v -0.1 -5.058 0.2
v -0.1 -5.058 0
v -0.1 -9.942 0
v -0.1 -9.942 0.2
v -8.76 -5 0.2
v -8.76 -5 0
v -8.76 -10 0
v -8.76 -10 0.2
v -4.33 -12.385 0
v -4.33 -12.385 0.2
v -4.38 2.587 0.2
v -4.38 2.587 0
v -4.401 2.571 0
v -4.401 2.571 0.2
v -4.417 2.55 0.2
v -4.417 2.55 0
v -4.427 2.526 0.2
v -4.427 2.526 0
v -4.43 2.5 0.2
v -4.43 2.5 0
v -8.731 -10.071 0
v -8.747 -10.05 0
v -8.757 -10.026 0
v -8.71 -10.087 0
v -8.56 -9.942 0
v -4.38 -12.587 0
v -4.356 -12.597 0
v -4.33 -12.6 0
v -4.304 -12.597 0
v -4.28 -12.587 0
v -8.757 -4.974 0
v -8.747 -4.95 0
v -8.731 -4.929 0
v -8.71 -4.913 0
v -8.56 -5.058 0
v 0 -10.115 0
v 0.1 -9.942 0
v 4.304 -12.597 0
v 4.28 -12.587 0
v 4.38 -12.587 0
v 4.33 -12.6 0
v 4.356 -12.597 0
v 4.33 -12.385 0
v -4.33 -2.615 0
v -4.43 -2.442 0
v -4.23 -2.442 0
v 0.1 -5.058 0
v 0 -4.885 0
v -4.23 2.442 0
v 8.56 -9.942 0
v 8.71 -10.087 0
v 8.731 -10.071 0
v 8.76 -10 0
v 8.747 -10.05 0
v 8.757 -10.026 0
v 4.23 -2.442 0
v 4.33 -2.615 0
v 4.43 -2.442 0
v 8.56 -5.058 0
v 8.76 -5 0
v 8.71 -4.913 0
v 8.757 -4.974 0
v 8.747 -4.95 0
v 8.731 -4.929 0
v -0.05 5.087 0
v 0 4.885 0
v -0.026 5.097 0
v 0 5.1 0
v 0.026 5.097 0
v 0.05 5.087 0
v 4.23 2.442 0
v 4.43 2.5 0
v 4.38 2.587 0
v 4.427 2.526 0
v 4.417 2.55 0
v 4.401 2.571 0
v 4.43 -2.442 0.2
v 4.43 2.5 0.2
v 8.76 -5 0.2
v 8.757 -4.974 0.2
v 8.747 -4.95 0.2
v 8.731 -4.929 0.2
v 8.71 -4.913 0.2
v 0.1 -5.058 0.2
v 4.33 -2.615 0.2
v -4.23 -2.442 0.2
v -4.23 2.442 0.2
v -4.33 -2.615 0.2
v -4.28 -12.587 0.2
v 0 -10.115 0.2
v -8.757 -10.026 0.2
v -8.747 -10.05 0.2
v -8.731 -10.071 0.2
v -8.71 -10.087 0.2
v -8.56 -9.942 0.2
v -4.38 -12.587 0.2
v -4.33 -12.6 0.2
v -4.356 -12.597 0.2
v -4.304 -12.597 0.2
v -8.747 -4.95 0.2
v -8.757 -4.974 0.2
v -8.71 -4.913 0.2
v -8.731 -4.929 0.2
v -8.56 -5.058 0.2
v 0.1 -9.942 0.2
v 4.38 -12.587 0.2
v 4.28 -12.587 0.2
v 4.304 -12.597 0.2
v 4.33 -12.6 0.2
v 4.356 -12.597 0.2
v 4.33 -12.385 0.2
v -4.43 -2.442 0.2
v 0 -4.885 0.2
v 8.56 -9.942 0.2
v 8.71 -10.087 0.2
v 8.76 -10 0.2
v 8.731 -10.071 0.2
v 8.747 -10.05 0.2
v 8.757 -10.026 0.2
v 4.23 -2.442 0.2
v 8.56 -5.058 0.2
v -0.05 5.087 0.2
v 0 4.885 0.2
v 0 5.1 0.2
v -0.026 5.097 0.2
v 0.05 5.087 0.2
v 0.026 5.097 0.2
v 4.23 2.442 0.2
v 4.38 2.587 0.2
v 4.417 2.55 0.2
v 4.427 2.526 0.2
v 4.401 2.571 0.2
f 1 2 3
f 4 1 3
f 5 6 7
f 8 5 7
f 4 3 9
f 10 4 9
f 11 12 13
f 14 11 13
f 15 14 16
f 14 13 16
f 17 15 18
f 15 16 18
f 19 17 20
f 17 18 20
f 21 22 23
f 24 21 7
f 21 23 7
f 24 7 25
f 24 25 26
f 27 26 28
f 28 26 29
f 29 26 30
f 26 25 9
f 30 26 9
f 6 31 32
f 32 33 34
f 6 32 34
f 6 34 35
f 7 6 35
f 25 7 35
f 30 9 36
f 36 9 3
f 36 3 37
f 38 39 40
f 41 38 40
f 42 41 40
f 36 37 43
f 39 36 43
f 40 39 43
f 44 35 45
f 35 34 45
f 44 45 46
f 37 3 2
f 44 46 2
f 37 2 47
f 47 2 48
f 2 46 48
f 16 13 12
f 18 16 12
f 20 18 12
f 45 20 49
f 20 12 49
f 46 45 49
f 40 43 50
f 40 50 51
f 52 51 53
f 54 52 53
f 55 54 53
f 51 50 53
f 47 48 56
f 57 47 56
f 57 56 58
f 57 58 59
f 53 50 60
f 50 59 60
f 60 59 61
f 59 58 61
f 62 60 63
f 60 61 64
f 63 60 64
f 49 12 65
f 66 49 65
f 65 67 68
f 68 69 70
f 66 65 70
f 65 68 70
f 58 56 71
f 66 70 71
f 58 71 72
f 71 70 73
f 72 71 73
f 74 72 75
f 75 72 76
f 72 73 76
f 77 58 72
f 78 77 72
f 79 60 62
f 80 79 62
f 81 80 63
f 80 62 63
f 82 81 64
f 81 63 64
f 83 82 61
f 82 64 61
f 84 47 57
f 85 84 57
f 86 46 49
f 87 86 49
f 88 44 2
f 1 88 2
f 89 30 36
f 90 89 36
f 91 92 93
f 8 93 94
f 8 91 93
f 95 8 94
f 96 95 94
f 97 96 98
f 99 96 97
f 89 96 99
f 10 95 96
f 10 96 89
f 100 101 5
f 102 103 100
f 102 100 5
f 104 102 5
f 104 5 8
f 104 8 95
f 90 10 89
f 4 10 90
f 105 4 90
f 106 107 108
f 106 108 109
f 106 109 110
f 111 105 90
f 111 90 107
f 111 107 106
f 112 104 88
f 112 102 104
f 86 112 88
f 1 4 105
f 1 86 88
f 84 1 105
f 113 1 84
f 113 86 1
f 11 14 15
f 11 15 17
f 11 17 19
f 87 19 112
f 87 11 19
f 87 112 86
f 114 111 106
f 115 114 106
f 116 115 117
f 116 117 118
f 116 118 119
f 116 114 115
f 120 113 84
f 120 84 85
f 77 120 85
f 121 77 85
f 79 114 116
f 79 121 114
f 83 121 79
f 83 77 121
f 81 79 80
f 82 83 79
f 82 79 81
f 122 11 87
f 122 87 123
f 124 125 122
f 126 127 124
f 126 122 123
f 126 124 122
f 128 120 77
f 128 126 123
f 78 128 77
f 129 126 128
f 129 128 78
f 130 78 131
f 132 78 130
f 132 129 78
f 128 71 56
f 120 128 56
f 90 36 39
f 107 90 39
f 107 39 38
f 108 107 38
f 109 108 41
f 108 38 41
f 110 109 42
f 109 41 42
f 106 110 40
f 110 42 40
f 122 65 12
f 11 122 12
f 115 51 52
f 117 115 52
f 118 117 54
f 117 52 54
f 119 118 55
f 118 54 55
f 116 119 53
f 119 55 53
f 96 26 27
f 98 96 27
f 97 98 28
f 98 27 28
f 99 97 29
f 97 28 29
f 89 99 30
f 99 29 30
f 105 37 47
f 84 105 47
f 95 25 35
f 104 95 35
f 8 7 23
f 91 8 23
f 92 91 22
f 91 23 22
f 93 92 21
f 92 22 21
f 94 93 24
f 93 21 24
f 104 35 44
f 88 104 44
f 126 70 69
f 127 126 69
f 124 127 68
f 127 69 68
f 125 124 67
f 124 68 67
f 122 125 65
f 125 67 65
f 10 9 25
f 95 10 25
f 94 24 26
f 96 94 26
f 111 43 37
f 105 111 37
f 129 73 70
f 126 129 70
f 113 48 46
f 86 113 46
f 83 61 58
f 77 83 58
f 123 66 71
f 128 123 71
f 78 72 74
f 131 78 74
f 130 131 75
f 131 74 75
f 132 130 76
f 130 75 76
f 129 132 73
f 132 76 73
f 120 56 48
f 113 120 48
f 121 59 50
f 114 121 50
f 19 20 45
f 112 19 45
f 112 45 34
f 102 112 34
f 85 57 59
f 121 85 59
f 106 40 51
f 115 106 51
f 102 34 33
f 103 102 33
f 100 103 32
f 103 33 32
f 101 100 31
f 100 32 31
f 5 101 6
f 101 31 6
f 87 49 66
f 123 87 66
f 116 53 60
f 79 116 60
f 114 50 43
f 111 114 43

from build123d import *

# Parameters (mm, degrees)
F1_DEPTH = 0.2


with BuildPart() as f1:
    # F0 (on Top) → F1 (new body)
    with BuildSketch(Plane.XY):
        with BuildLine():
            Line((-4.2435244785, 2.55), (-0.0866025404, 4.95))
            ThreePointArc((-0.0866025404, 4.95), (-0.0965925826, 5.0258819045), (-0.05, 5.0866025404))
            Line((-0.05, 5.0866025404), (-4.3801270189, 2.5866025404))
            ThreePointArc((-4.3801270189, 2.5866025404), (-4.3042451144, 2.5965925826), (-4.2435244785, 2.55))
        make_face()
        with BuildLine():
            Line((-4.3301270189, 2.5), (-4.2435244785, 2.55))
            ThreePointArc((-4.2435244785, 2.55), (-4.3042451144, 2.5965925826), (-4.3801270189, 2.5866025404))
            ThreePointArc((-4.3801270189, 2.5866025404), (-4.4167295593, 2.55), (-4.4301270189, 2.5))
            ThreePointArc((-4.4301270189, 2.5), (-4.400837697, 2.4292893219), (-4.3301270189, 2.4))
            Line((-4.3301270189, 2.4), (-4.3301270189, 2.5))
        make_face()
        with BuildLine():
            ThreePointArc((-4.2301270189, 2.5), (-4.2335344363, 2.5258819045), (-4.2435244785, 2.55))
            Line((-4.2435244785, 2.55), (-4.3301270189, 2.5))
            Line((-4.3301270189, 2.5), (-4.3301270189, 2.4))
            ThreePointArc((-4.3301270189, 2.4), (-4.3042451144, 2.4034074174), (-4.2801270189, 2.4133974596))
            Line((-4.2801270189, 2.4133974596), (-4.2301270189, 2.4422649731))
            Line((-4.2301270189, 2.4422649731), (-4.2301270189, 2.5))
        make_face()
        with BuildLine():
            Line((-4.3301270189, -2.4), (-4.3301270189, 2.4))
            ThreePointArc((-4.3301270189, 2.4), (-4.400837697, 2.4292893219), (-4.4301270189, 2.5))
            Line((-4.4301270189, 2.5), (-4.4301270189, -2.4422649731))
            Line((-4.4301270189, -2.4422649731), (-4.3801270189, -2.4133974596))
            ThreePointArc((-4.3801270189, -2.4133974596), (-4.3560089234, -2.4034074174), (-4.3301270189, -2.4))
        make_face()
        with BuildLine():
            Line((-4.2301270189, -2.4422649731), (-4.2301270189, 2.4422649731))
            Line((-4.2301270189, 2.4422649731), (-4.2801270189, 2.4133974596))
            ThreePointArc((-4.2801270189, 2.4133974596), (-4.3042451144, 2.4034074174), (-4.3301270189, 2.4))
            Line((-4.3301270189, 2.4), (-4.3301270189, -2.4))
            ThreePointArc((-4.3301270189, -2.4), (-4.3042451144, -2.4034074174), (-4.2801270189, -2.4133974596))
            Line((-4.2801270189, -2.4133974596), (-4.2301270189, -2.4422649731))
        make_face()
        with BuildLine():
            ThreePointArc((-0.05, 4.9133974596), (-0.0707106781, 4.9292893219), (-0.0866025404, 4.95))
            Line((-0.0866025404, 4.95), (-4.2435244785, 2.55))
            ThreePointArc((-4.2435244785, 2.55), (-4.2335344363, 2.5258819045), (-4.2301270189, 2.5))
            Line((-4.2301270189, 2.5), (-4.2301270189, 2.4422649731))
            Line((-4.2301270189, 2.4422649731), (0, 4.8845299462))
            Line((0, 4.8845299462), (-0.05, 4.9133974596))
        make_face()
        with BuildLine():
            Line((0.0866025404, 4.95), (0, 5))
            Line((0, 5), (-0.0866025404, 4.95))
            ThreePointArc((-0.0866025404, 4.95), (-0.0707106781, 4.9292893219), (-0.05, 4.9133974596))
            Line((-0.05, 4.9133974596), (0, 4.8845299462))
            Line((0, 4.8845299462), (0.05, 4.9133974596))
            ThreePointArc((0.05, 4.9133974596), (0.0707106781, 4.9292893219), (0.0866025404, 4.95))
        make_face()
        with BuildLine():
            Line((-0.0866025404, 4.95), (0, 5))
            Line((0, 5), (0.0866025404, 4.95))
            ThreePointArc((0.0866025404, 4.95), (0.0965925826, 5.0258819045), (0.05, 5.0866025404))
            ThreePointArc((0.05, 5.0866025404), (0, 5.1), (-0.05, 5.0866025404))
            ThreePointArc((-0.05, 5.0866025404), (-0.0965925826, 5.0258819045), (-0.0866025404, 4.95))
        make_face()
        with BuildLine():
            ThreePointArc((0.05, 5.0866025404), (0.0965925826, 5.0258819045), (0.0866025404, 4.95))
            Line((0.0866025404, 4.95), (4.2435244785, 2.55))
            ThreePointArc((4.2435244785, 2.55), (4.3042451144, 2.5965925826), (4.3801270189, 2.5866025404))
            Line((4.3801270189, 2.5866025404), (0.05, 5.0866025404))
        make_face()
        with BuildLine():
            Line((4.2435244785, 2.55), (0.0866025404, 4.95))
            ThreePointArc((0.0866025404, 4.95), (0.0707106781, 4.9292893219), (0.05, 4.9133974596))
            Line((0.05, 4.9133974596), (0, 4.8845299462))
            Line((0, 4.8845299462), (4.2301270189, 2.4422649731))
            Line((4.2301270189, 2.4422649731), (4.2301270189, 2.5))
            ThreePointArc((4.2301270189, 2.5), (4.2335344363, 2.5258819045), (4.2435244785, 2.55))
        make_face()
        with BuildLine():
            Line((4.3301270189, 2.5), (4.2435244785, 2.55))
            ThreePointArc((4.2435244785, 2.55), (4.2335344363, 2.5258819045), (4.2301270189, 2.5))
            Line((4.2301270189, 2.5), (4.2301270189, 2.4422649731))
            Line((4.2301270189, 2.4422649731), (4.2801270189, 2.4133974596))
            ThreePointArc((4.2801270189, 2.4133974596), (4.3042451144, 2.4034074174), (4.3301270189, 2.4))
            Line((4.3301270189, 2.4), (4.3301270189, 2.5))
        make_face()
        with BuildLine():
            ThreePointArc((4.3801270189, 2.5866025404), (4.3042451144, 2.5965925826), (4.2435244785, 2.55))
            Line((4.2435244785, 2.55), (4.3301270189, 2.5))
            Line((4.3301270189, 2.5), (4.3301270189, 2.4))
            ThreePointArc((4.3301270189, 2.4), (4.400837697, 2.4292893219), (4.4301270189, 2.5))
            ThreePointArc((4.4301270189, 2.5), (4.4167295593, 2.55), (4.3801270189, 2.5866025404))
        make_face()
        with BuildLine():
            Line((4.3301270189, -2.4), (4.3301270189, 2.4))
            ThreePointArc((4.3301270189, 2.4), (4.3042451144, 2.4034074174), (4.2801270189, 2.4133974596))
            Line((4.2801270189, 2.4133974596), (4.2301270189, 2.4422649731))
            Line((4.2301270189, 2.4422649731), (4.2301270189, -2.4422649731))
            Line((4.2301270189, -2.4422649731), (4.2801270189, -2.4133974596))
            ThreePointArc((4.2801270189, -2.4133974596), (4.3042451144, -2.4034074174), (4.3301270189, -2.4))
        make_face()
        with BuildLine():
            ThreePointArc((4.4301270189, 2.5), (4.400837697, 2.4292893219), (4.3301270189, 2.4))
            Line((4.3301270189, 2.4), (4.3301270189, -2.4))
            ThreePointArc((4.3301270189, -2.4), (4.3560089234, -2.4034074174), (4.3801270189, -2.4133974596))
            Line((4.3801270189, -2.4133974596), (4.4301270189, -2.4422649731))
            Line((4.4301270189, -2.4422649731), (4.4301270189, 2.5))
        make_face()
        with BuildLine():
            Line((4.2801270189, -2.4133974596), (4.2301270189, -2.4422649731))
            Line((4.2301270189, -2.4422649731), (4.2301270189, -2.5))
            ThreePointArc((4.2301270189, -2.5), (4.2435244785, -2.45), (4.2801270189, -2.4133974596))
        make_face()
        with BuildLine():
            Line((4.4301270189, -2.5), (4.4301270189, -2.4422649731))
            Line((4.4301270189, -2.4422649731), (4.3801270189, -2.4133974596))
            ThreePointArc((4.3801270189, -2.4133974596), (4.4167295593, -2.45), (4.4301270189, -2.5))
        make_face()
        with BuildLine():
            ThreePointArc((4.3801270189, -2.4133974596), (4.3560089234, -2.4034074174), (4.3301270189, -2.4))
            Line((4.3301270189, -2.4), (4.3301270189, -2.5))
            Line((4.3301270189, -2.5), (4.4167295593, -2.55))
            ThreePointArc((4.4167295593, -2.55), (4.4267196016, -2.5258819045), (4.4301270189, -2.5))
            ThreePointArc((4.4301270189, -2.5), (4.4167295593, -2.45), (4.3801270189, -2.4133974596))
        make_face()
        with BuildLine():
            Line((4.3301270189, -2.5), (4.3301270189, -2.4))
            ThreePointArc((4.3301270189, -2.4), (4.3042451144, -2.4034074174), (4.2801270189, -2.4133974596))
            ThreePointArc((4.2801270189, -2.4133974596), (4.2435244785, -2.45), (4.2301270189, -2.5))
            ThreePointArc((4.2301270189, -2.5), (4.2335344363, -2.5258819045), (4.2435244785, -2.55))
            Line((4.2435244785, -2.55), (4.3301270189, -2.5))
        make_face()
        with BuildLine():
            ThreePointArc((4.3801270189, -2.5866025404), (4.3301270189, -2.6), (4.2801270189, -2.5866025404))
            Line((4.2801270189, -2.5866025404), (4.3301270189, -2.6154700538))
            Line((4.3301270189, -2.6154700538), (4.3801270189, -2.5866025404))
        make_face()
        with BuildLine():
            Line((4.4167295593, -2.55), (4.3301270189, -2.5))
            Line((4.3301270189, -2.5), (4.2435244785, -2.55))
            ThreePointArc((4.2435244785, -2.55), (4.2594163408, -2.5707106781), (4.2801270189, -2.5866025404))
            ThreePointArc((4.2801270189, -2.5866025404), (4.3301270189, -2.6), (4.3801270189, -2.5866025404))
            ThreePointArc((4.3801270189, -2.5866025404), (4.400837697, -2.5707106781), (4.4167295593, -2.55))
        make_face()
        with BuildLine():
            Line((4.2301270189, -2.5), (4.2301270189, -2.4422649731))
            Line((4.2301270189, -2.4422649731), (0, -4.8845299462))
            Line((0, -4.8845299462), (0.05, -4.9133974596))
            ThreePointArc((0.05, -4.9133974596), (0.0707106781, -4.9292893219), (0.0866025404, -4.95))
            Line((0.0866025404, -4.95), (4.2435244785, -2.55))
            ThreePointArc((4.2435244785, -2.55), (4.2335344363, -2.5258819045), (4.2301270189, -2.5))
        make_face()
        with BuildLine():
            ThreePointArc((4.2801270189, -2.5866025404), (4.2594163408, -2.5707106781), (4.2435244785, -2.55))
            Line((4.2435244785, -2.55), (0.0866025404, -4.95))
            ThreePointArc((0.0866025404, -4.95), (0.0965925826, -4.9741180955), (0.1, -5))
            Line((0.1, -5), (0.1, -5.0577350269))
            Line((0.1, -5.0577350269), (4.3301270189, -2.6154700538))
            Line((4.3301270189, -2.6154700538), (4.2801270189, -2.5866025404))
        make_face()
        with BuildLine():
            Line((8.5736514975, -4.95), (4.4167295593, -2.55))
            ThreePointArc((4.4167295593, -2.55), (4.400837697, -2.5707106781), (4.3801270189, -2.5866025404))
            Line((4.3801270189, -2.5866025404), (4.3301270189, -2.6154700538))
            Line((4.3301270189, -2.6154700538), (8.5602540378, -5.0577350269))
            Line((8.5602540378, -5.0577350269), (8.5602540378, -5))
            ThreePointArc((8.5602540378, -5), (8.5636614552, -4.9741180955), (8.5736514975, -4.95))
        make_face()
        with BuildLine():
            Line((8.7102540378, -4.9133974596), (4.4301270189, -2.4422649731))
            Line((4.4301270189, -2.4422649731), (4.4301270189, -2.5))
            ThreePointArc((4.4301270189, -2.5), (4.4267196016, -2.5258819045), (4.4167295593, -2.55))
            Line((4.4167295593, -2.55), (8.5736514975, -4.95))
            ThreePointArc((8.5736514975, -4.95), (8.6343721333, -4.9034074174), (8.7102540378, -4.9133974596))
        make_face()
        with BuildLine():
            Line((8.6602540378, -5), (8.5736514975, -4.95))
            ThreePointArc((8.5736514975, -4.95), (8.5636614552, -4.9741180955), (8.5602540378, -5))
            Line((8.5602540378, -5), (8.5602540378, -5.0577350269))
            Line((8.5602540378, -5.0577350269), (8.6102540378, -5.0866025404))
            ThreePointArc((8.6102540378, -5.0866025404), (8.6343721333, -5.0965925826), (8.6602540378, -5.1))
            Line((8.6602540378, -5.1), (8.6602540378, -5))
        make_face()
        with BuildLine():
            ThreePointArc((8.7602540378, -5), (8.7468565782, -4.95), (8.7102540378, -4.9133974596))
            ThreePointArc((8.7102540378, -4.9133974596), (8.6343721333, -4.9034074174), (8.5736514975, -4.95))
            Line((8.5736514975, -4.95), (8.6602540378, -5))
            Line((8.6602540378, -5), (8.6602540378, -5.1))
            ThreePointArc((8.6602540378, -5.1), (8.730964716, -5.0707106781), (8.7602540378, -5))
        make_face()
        with BuildLine():
            Line((8.7602540378, -10), (8.7602540378, -5))
            ThreePointArc((8.7602540378, -5), (8.730964716, -5.0707106781), (8.6602540378, -5.1))
            Line((8.6602540378, -5.1), (8.6602540378, -9.9))
            ThreePointArc((8.6602540378, -9.9), (8.730964716, -9.9292893219), (8.7602540378, -10))
        make_face()
        with BuildLine():
            Line((8.6602540378, -9.9), (8.6602540378, -5.1))
            ThreePointArc((8.6602540378, -5.1), (8.6343721333, -5.0965925826), (8.6102540378, -5.0866025404))
            Line((8.6102540378, -5.0866025404), (8.5602540378, -5.0577350269))
            Line((8.5602540378, -5.0577350269), (8.5602540378, -9.9422649731))
            Line((8.5602540378, -9.9422649731), (8.6102540378, -9.9133974596))
            ThreePointArc((8.6102540378, -9.9133974596), (8.6343721333, -9.9034074174), (8.6602540378, -9.9))
        make_face()
        with BuildLine():
            Line((8.6602540378, -10), (8.6602540378, -9.9))
            ThreePointArc((8.6602540378, -9.9), (8.6343721333, -9.9034074174), (8.6102540378, -9.9133974596))
            Line((8.6102540378, -9.9133974596), (8.5602540378, -9.9422649731))
            Line((8.5602540378, -9.9422649731), (8.5602540378, -10))
            ThreePointArc((8.5602540378, -10), (8.5636614552, -10.0258819045), (8.5736514975, -10.05))
            Line((8.5736514975, -10.05), (8.6602540378, -10))
        make_face()
        with BuildLine():
            ThreePointArc((8.7102540378, -10.0866025404), (8.7468565782, -10.05), (8.7602540378, -10))
            ThreePointArc((8.7602540378, -10), (8.730964716, -9.9292893219), (8.6602540378, -9.9))
            Line((8.6602540378, -9.9), (8.6602540378, -10))
            Line((8.6602540378, -10), (8.5736514975, -10.05))
            ThreePointArc((8.5736514975, -10.05), (8.6343721333, -10.0965925826), (8.7102540378, -10.0866025404))
        make_face()
        with BuildLine():
            Line((4.3801270189, -12.5866025404), (8.7102540378, -10.0866025404))
            ThreePointArc((8.7102540378, -10.0866025404), (8.6343721333, -10.0965925826), (8.5736514975, -10.05))
            Line((8.5736514975, -10.05), (4.4167295593, -12.45))
            ThreePointArc((4.4167295593, -12.45), (4.4267196016, -12.5258819045), (4.3801270189, -12.5866025404))
        make_face()
        with BuildLine():
            Line((4.4167295593, -12.45), (8.5736514975, -10.05))
            ThreePointArc((8.5736514975, -10.05), (8.5636614552, -10.0258819045), (8.5602540378, -10))
            Line((8.5602540378, -10), (8.5602540378, -9.9422649731))
            Line((8.5602540378, -9.9422649731), (4.3301270189, -12.3845299462))
            Line((4.3301270189, -12.3845299462), (4.3801270189, -12.4133974596))
            ThreePointArc((4.3801270189, -12.4133974596), (4.400837697, -12.4292893219), (4.4167295593, -12.45))
        make_face()
        with BuildLine():
            ThreePointArc((4.2801270189, -12.5866025404), (4.3301270189, -12.6), (4.3801270189, -12.5866025404))
            ThreePointArc((4.3801270189, -12.5866025404), (4.4267196016, -12.5258819045), (4.4167295593, -12.45))
            Line((4.4167295593, -12.45), (4.3301270189, -12.5))
            Line((4.3301270189, -12.5), (4.2435244785, -12.45))
            ThreePointArc((4.2435244785, -12.45), (4.2335344363, -12.5258819045), (4.2801270189, -12.5866025404))
        make_face()
        with BuildLine():
            Line((4.3301270189, -12.5), (4.4167295593, -12.45))
            ThreePointArc((4.4167295593, -12.45), (4.400837697, -12.4292893219), (4.3801270189, -12.4133974596))
            Line((4.3801270189, -12.4133974596), (4.3301270189, -12.3845299462))
            Line((4.3301270189, -12.3845299462), (4.2801270189, -12.4133974596))
            ThreePointArc((4.2801270189, -12.4133974596), (4.2594163408, -12.4292893219), (4.2435244785, -12.45))
            Line((4.2435244785, -12.45), (4.3301270189, -12.5))
        make_face()
        with BuildLine():
            Line((4.3301270189, -12.3845299462), (0.1, -9.9422649731))
            Line((0.1, -9.9422649731), (0.1, -10))
            ThreePointArc((0.1, -10), (0.0965925826, -10.0258819045), (0.0866025404, -10.05))
            Line((0.0866025404, -10.05), (4.2435244785, -12.45))
            ThreePointArc((4.2435244785, -12.45), (4.2594163408, -12.4292893219), (4.2801270189, -12.4133974596))
            Line((4.2801270189, -12.4133974596), (4.3301270189, -12.3845299462))
        make_face()
        with BuildLine():
            Line((0, -10.1154700538), (4.2801270189, -12.5866025404))
            ThreePointArc((4.2801270189, -12.5866025404), (4.2335344363, -12.5258819045), (4.2435244785, -12.45))
            Line((4.2435244785, -12.45), (0.0866025404, -10.05))
            ThreePointArc((0.0866025404, -10.05), (0.0707106781, -10.0707106781), (0.05, -10.0866025404))
            Line((0.05, -10.0866025404), (0, -10.1154700538))
        make_face()
        with BuildLine():
            Line((0.05, -4.9133974596), (0, -4.8845299462))
            Line((0, -4.8845299462), (-0.05, -4.9133974596))
            ThreePointArc((-0.05, -4.9133974596), (0, -4.9), (0.05, -4.9133974596))
        make_face()
        with BuildLine():
            ThreePointArc((-0.05, -5.0866025404), (-0.0866025404, -5.05), (-0.1, -5))
            Line((-0.1, -5), (-0.1, -5.0577350269))
            Line((-0.1, -5.0577350269), (-0.05, -5.0866025404))
        make_face()
        with BuildLine():
            Line((0.1, -5.0577350269), (0.1, -5))
            ThreePointArc((0.1, -5), (0.0866025404, -5.05), (0.05, -5.0866025404))
            Line((0.05, -5.0866025404), (0.1, -5.0577350269))
        make_face()
        with BuildLine():
            ThreePointArc((0.1, -5), (0.0965925826, -4.9741180955), (0.0866025404, -4.95))
            Line((0.0866025404, -4.95), (0, -5))
            Line((0, -5), (0, -5.1))
            ThreePointArc((0, -5.1), (0.0258819045, -5.0965925826), (0.05, -5.0866025404))
            ThreePointArc((0.05, -5.0866025404), (0.0866025404, -5.05), (0.1, -5))
        make_face()
        with BuildLine():
            Line((0, -5), (-0.0866025404, -4.95))
            ThreePointArc((-0.0866025404, -4.95), (-0.0965925826, -4.9741180955), (-0.1, -5))
            ThreePointArc((-0.1, -5), (-0.0866025404, -5.05), (-0.05, -5.0866025404))
            ThreePointArc((-0.05, -5.0866025404), (-0.0258819045, -5.0965925826), (0, -5.1))
            Line((0, -5.1), (0, -5))
        make_face()
        with BuildLine():
            ThreePointArc((0.05, -4.9133974596), (0, -4.9), (-0.05, -4.9133974596))
            ThreePointArc((-0.05, -4.9133974596), (-0.0707106781, -4.9292893219), (-0.0866025404, -4.95))
            Line((-0.0866025404, -4.95), (0, -5))
            Line((0, -5), (0.0866025404, -4.95))
            ThreePointArc((0.0866025404, -4.95), (0.0707106781, -4.9292893219), (0.05, -4.9133974596))
        make_face()
        with BuildLine():
            ThreePointArc((0.05, -5.0866025404), (0.0258819045, -5.0965925826), (0, -5.1))
            Line((0, -5.1), (0, -9.9))
            ThreePointArc((0, -9.9), (0.0258819045, -9.9034074174), (0.05, -9.9133974596))
            Line((0.05, -9.9133974596), (0.1, -9.9422649731))
            Line((0.1, -9.9422649731), (0.1, -5.0577350269))
            Line((0.1, -5.0577350269), (0.05, -5.0866025404))
        make_face()
        with BuildLine():
            Line((0, -9.9), (0, -5.1))
            ThreePointArc((0, -5.1), (-0.0258819045, -5.0965925826), (-0.05, -5.0866025404))
            Line((-0.05, -5.0866025404), (-0.1, -5.0577350269))
            Line((-0.1, -5.0577350269), (-0.1, -9.9422649731))
            Line((-0.1, -9.9422649731), (-0.05, -9.9133974596))
            ThreePointArc((-0.05, -9.9133974596), (-0.0258819045, -9.9034074174), (0, -9.9))
        make_face()
        with BuildLine():
            Line((0, -4.8845299462), (-4.2301270189, -2.4422649731))
            Line((-4.2301270189, -2.4422649731), (-4.2301270189, -2.5))
            ThreePointArc((-4.2301270189, -2.5), (-4.2335344363, -2.5258819045), (-4.2435244785, -2.55))
            Line((-4.2435244785, -2.55), (-0.0866025404, -4.95))
            ThreePointArc((-0.0866025404, -4.95), (-0.0707106781, -4.9292893219), (-0.05, -4.9133974596))
            Line((-0.05, -4.9133974596), (0, -4.8845299462))
        make_face()
        with BuildLine():
            Line((-0.0866025404, -4.95), (-4.2435244785, -2.55))
            ThreePointArc((-4.2435244785, -2.55), (-4.2594163408, -2.5707106781), (-4.2801270189, -2.5866025404))
            Line((-4.2801270189, -2.5866025404), (-4.3301270189, -2.6154700538))
            Line((-4.3301270189, -2.6154700538), (-0.1, -5.0577350269))
            Line((-0.1, -5.0577350269), (-0.1, -5))
            ThreePointArc((-0.1, -5), (-0.0965925826, -4.9741180955), (-0.0866025404, -4.95))
        make_face()
        with BuildLine():
            Line((0.1, -10), (0.1, -9.9422649731))
            Line((0.1, -9.9422649731), (0.05, -9.9133974596))
            ThreePointArc((0.05, -9.9133974596), (0.0866025404, -9.95), (0.1, -10))
        make_face()
        with BuildLine():
            Line((-0.05, -9.9133974596), (-0.1, -9.9422649731))
            Line((-0.1, -9.9422649731), (-0.1, -10))
            ThreePointArc((-0.1, -10), (-0.0866025404, -9.95), (-0.05, -9.9133974596))
        make_face()
        with BuildLine():
            Line((-0.05, -10.0866025404), (0, -10.1154700538))
            Line((0, -10.1154700538), (0.05, -10.0866025404))
            ThreePointArc((0.05, -10.0866025404), (0, -10.1), (-0.05, -10.0866025404))
        make_face()
        with BuildLine():
            ThreePointArc((-4.2435244785, -12.45), (-4.2335344363, -12.5258819045), (-4.2801270189, -12.5866025404))
            Line((-4.2801270189, -12.5866025404), (0, -10.1154700538))
            Line((0, -10.1154700538), (-0.05, -10.0866025404))
            ThreePointArc((-0.05, -10.0866025404), (-0.0707106781, -10.0707106781), (-0.0866025404, -10.05))
            Line((-0.0866025404, -10.05), (-4.2435244785, -12.45))
        make_face()
        with BuildLine():
            Line((-0.1, -10), (-0.1, -9.9422649731))
            Line((-0.1, -9.9422649731), (-4.3301270189, -12.3845299462))
            Line((-4.3301270189, -12.3845299462), (-4.2801270189, -12.4133974596))
            ThreePointArc((-4.2801270189, -12.4133974596), (-4.2594163408, -12.4292893219), (-4.2435244785, -12.45))
            Line((-4.2435244785, -12.45), (-0.0866025404, -10.05))
            ThreePointArc((-0.0866025404, -10.05), (-0.0965925826, -10.0258819045), (-0.1, -10))
        make_face()
        with BuildLine():
            Line((0, -10), (0, -9.9))
            ThreePointArc((0, -9.9), (-0.0258819045, -9.9034074174), (-0.05, -9.9133974596))
            ThreePointArc((-0.05, -9.9133974596), (-0.0866025404, -9.95), (-0.1, -10))
            ThreePointArc((-0.1, -10), (-0.0965925826, -10.0258819045), (-0.0866025404, -10.05))
            Line((-0.0866025404, -10.05), (0, -10))
        make_face()
        with BuildLine():
            ThreePointArc((0.05, -9.9133974596), (0.0258819045, -9.9034074174), (0, -9.9))
            Line((0, -9.9), (0, -10))
            Line((0, -10), (0.0866025404, -10.05))
            ThreePointArc((0.0866025404, -10.05), (0.0965925826, -10.0258819045), (0.1, -10))
            ThreePointArc((0.1, -10), (0.0866025404, -9.95), (0.05, -9.9133974596))
        make_face()
        with BuildLine():
            Line((0.0866025404, -10.05), (0, -10))
            Line((0, -10), (-0.0866025404, -10.05))
            ThreePointArc((-0.0866025404, -10.05), (-0.0707106781, -10.0707106781), (-0.05, -10.0866025404))
            ThreePointArc((-0.05, -10.0866025404), (0, -10.1), (0.05, -10.0866025404))
            ThreePointArc((0.05, -10.0866025404), (0.0707106781, -10.0707106781), (0.0866025404, -10.05))
        make_face()
        with BuildLine():
            ThreePointArc((-4.3801270189, -12.4133974596), (-4.400837697, -12.4292893219), (-4.4167295593, -12.45))
            Line((-4.4167295593, -12.45), (-4.3301270189, -12.5))
            Line((-4.3301270189, -12.5), (-4.2435244785, -12.45))
            ThreePointArc((-4.2435244785, -12.45), (-4.2594163408, -12.4292893219), (-4.2801270189, -12.4133974596))
            Line((-4.2801270189, -12.4133974596), (-4.3301270189, -12.3845299462))
            Line((-4.3301270189, -12.3845299462), (-4.3801270189, -12.4133974596))
        make_face()
        with BuildLine():
            ThreePointArc((-4.4167295593, -12.45), (-4.4267196016, -12.5258819045), (-4.3801270189, -12.5866025404))
            ThreePointArc((-4.3801270189, -12.5866025404), (-4.3301270189, -12.6), (-4.2801270189, -12.5866025404))
            ThreePointArc((-4.2801270189, -12.5866025404), (-4.2335344363, -12.5258819045), (-4.2435244785, -12.45))
            Line((-4.2435244785, -12.45), (-4.3301270189, -12.5))
            Line((-4.3301270189, -12.5), (-4.4167295593, -12.45))
        make_face()
        with BuildLine():
            ThreePointArc((-8.5736514975, -10.05), (-8.6343721333, -10.0965925826), (-8.7102540378, -10.0866025404))
            Line((-8.7102540378, -10.0866025404), (-4.3801270189, -12.5866025404))
            ThreePointArc((-4.3801270189, -12.5866025404), (-4.4267196016, -12.5258819045), (-4.4167295593, -12.45))
            Line((-4.4167295593, -12.45), (-8.5736514975, -10.05))
        make_face()
        with BuildLine():
            ThreePointArc((-8.5602540378, -10), (-8.5636614552, -10.0258819045), (-8.5736514975, -10.05))
            Line((-8.5736514975, -10.05), (-4.4167295593, -12.45))
            ThreePointArc((-4.4167295593, -12.45), (-4.400837697, -12.4292893219), (-4.3801270189, -12.4133974596))
            Line((-4.3801270189, -12.4133974596), (-4.3301270189, -12.3845299462))
            Line((-4.3301270189, -12.3845299462), (-8.5602540378, -9.9422649731))
            Line((-8.5602540378, -9.9422649731), (-8.5602540378, -10))
        make_face()
        with BuildLine():
            ThreePointArc((-8.6102540378, -9.9133974596), (-8.6343721333, -9.9034074174), (-8.6602540378, -9.9))
            Line((-8.6602540378, -9.9), (-8.6602540378, -10))
            Line((-8.6602540378, -10), (-8.5736514975, -10.05))
            ThreePointArc((-8.5736514975, -10.05), (-8.5636614552, -10.0258819045), (-8.5602540378, -10))
            Line((-8.5602540378, -10), (-8.5602540378, -9.9422649731))
            Line((-8.5602540378, -9.9422649731), (-8.6102540378, -9.9133974596))
        make_face()
        with BuildLine():
            ThreePointArc((-8.6602540378, -9.9), (-8.730964716, -9.9292893219), (-8.7602540378, -10))
            ThreePointArc((-8.7602540378, -10), (-8.7468565782, -10.05), (-8.7102540378, -10.0866025404))
            ThreePointArc((-8.7102540378, -10.0866025404), (-8.6343721333, -10.0965925826), (-8.5736514975, -10.05))
            Line((-8.5736514975, -10.05), (-8.6602540378, -10))
            Line((-8.6602540378, -10), (-8.6602540378, -9.9))
        make_face()
        with BuildLine():
            ThreePointArc((-8.6602540378, -5.1), (-8.730964716, -5.0707106781), (-8.7602540378, -5))
            Line((-8.7602540378, -5), (-8.7602540378, -10))
            ThreePointArc((-8.7602540378, -10), (-8.730964716, -9.9292893219), (-8.6602540378, -9.9))
            Line((-8.6602540378, -9.9), (-8.6602540378, -5.1))
        make_face()
        with BuildLine():
            ThreePointArc((-8.6102540378, -5.0866025404), (-8.6343721333, -5.0965925826), (-8.6602540378, -5.1))
            Line((-8.6602540378, -5.1), (-8.6602540378, -9.9))
            ThreePointArc((-8.6602540378, -9.9), (-8.6343721333, -9.9034074174), (-8.6102540378, -9.9133974596))
            Line((-8.6102540378, -9.9133974596), (-8.5602540378, -9.9422649731))
            Line((-8.5602540378, -9.9422649731), (-8.5602540378, -5.0577350269))
            Line((-8.5602540378, -5.0577350269), (-8.6102540378, -5.0866025404))
        make_face()
        with BuildLine():
            ThreePointArc((-8.5602540378, -5), (-8.5636614552, -4.9741180955), (-8.5736514975, -4.95))
            Line((-8.5736514975, -4.95), (-8.6602540378, -5))
            Line((-8.6602540378, -5), (-8.6602540378, -5.1))
            ThreePointArc((-8.6602540378, -5.1), (-8.6343721333, -5.0965925826), (-8.6102540378, -5.0866025404))
            Line((-8.6102540378, -5.0866025404), (-8.5602540378, -5.0577350269))
            Line((-8.5602540378, -5.0577350269), (-8.5602540378, -5))
        make_face()
        with BuildLine():
            ThreePointArc((-8.5736514975, -4.95), (-8.6343721333, -4.9034074174), (-8.7102540378, -4.9133974596))
            ThreePointArc((-8.7102540378, -4.9133974596), (-8.7468565782, -4.95), (-8.7602540378, -5))
            ThreePointArc((-8.7602540378, -5), (-8.730964716, -5.0707106781), (-8.6602540378, -5.1))
            Line((-8.6602540378, -5.1), (-8.6602540378, -5))
            Line((-8.6602540378, -5), (-8.5736514975, -4.95))
        make_face()
        with BuildLine():
            Line((-4.4301270189, -2.5), (-4.4301270189, -2.4422649731))
            Line((-4.4301270189, -2.4422649731), (-8.7102540378, -4.9133974596))
            ThreePointArc((-8.7102540378, -4.9133974596), (-8.6343721333, -4.9034074174), (-8.5736514975, -4.95))
            Line((-8.5736514975, -4.95), (-4.4167295593, -2.55))
            ThreePointArc((-4.4167295593, -2.55), (-4.4267196016, -2.5258819045), (-4.4301270189, -2.5))
        make_face()
        with BuildLine():
            ThreePointArc((-4.3801270189, -2.5866025404), (-4.400837697, -2.5707106781), (-4.4167295593, -2.55))
            Line((-4.4167295593, -2.55), (-8.5736514975, -4.95))
            ThreePointArc((-8.5736514975, -4.95), (-8.5636614552, -4.9741180955), (-8.5602540378, -5))
            Line((-8.5602540378, -5), (-8.5602540378, -5.0577350269))
            Line((-8.5602540378, -5.0577350269), (-4.3301270189, -2.6154700538))
            Line((-4.3301270189, -2.6154700538), (-4.3801270189, -2.5866025404))
        make_face()
        with BuildLine():
            Line((-4.3801270189, -2.4133974596), (-4.4301270189, -2.4422649731))
            Line((-4.4301270189, -2.4422649731), (-4.4301270189, -2.5))
            ThreePointArc((-4.4301270189, -2.5), (-4.4167295593, -2.45), (-4.3801270189, -2.4133974596))
        make_face()
        with BuildLine():
            Line((-4.2301270189, -2.5), (-4.2301270189, -2.4422649731))
            Line((-4.2301270189, -2.4422649731), (-4.2801270189, -2.4133974596))
            ThreePointArc((-4.2801270189, -2.4133974596), (-4.2435244785, -2.45), (-4.2301270189, -2.5))
        make_face()
        with BuildLine():
            Line((-4.3301270189, -2.5), (-4.3301270189, -2.4))
            ThreePointArc((-4.3301270189, -2.4), (-4.3560089234, -2.4034074174), (-4.3801270189, -2.4133974596))
            ThreePointArc((-4.3801270189, -2.4133974596), (-4.4167295593, -2.45), (-4.4301270189, -2.5))
            ThreePointArc((-4.4301270189, -2.5), (-4.4267196016, -2.5258819045), (-4.4167295593, -2.55))
            Line((-4.4167295593, -2.55), (-4.3301270189, -2.5))
        make_face()
        with BuildLine():
            Line((-4.3301270189, -2.6154700538), (-4.2801270189, -2.5866025404))
            ThreePointArc((-4.2801270189, -2.5866025404), (-4.3301270189, -2.6), (-4.3801270189, -2.5866025404))
            Line((-4.3801270189, -2.5866025404), (-4.3301270189, -2.6154700538))
        make_face()
        with BuildLine():
            Line((-4.2435244785, -2.55), (-4.3301270189, -2.5))
            Line((-4.3301270189, -2.5), (-4.4167295593, -2.55))
            ThreePointArc((-4.4167295593, -2.55), (-4.400837697, -2.5707106781), (-4.3801270189, -2.5866025404))
            ThreePointArc((-4.3801270189, -2.5866025404), (-4.3301270189, -2.6), (-4.2801270189, -2.5866025404))
            ThreePointArc((-4.2801270189, -2.5866025404), (-4.2594163408, -2.5707106781), (-4.2435244785, -2.55))
        make_face()
        with BuildLine():
            ThreePointArc((-4.2801270189, -2.4133974596), (-4.3042451144, -2.4034074174), (-4.3301270189, -2.4))
            Line((-4.3301270189, -2.4), (-4.3301270189, -2.5))
            Line((-4.3301270189, -2.5), (-4.2435244785, -2.55))
            ThreePointArc((-4.2435244785, -2.55), (-4.2335344363, -2.5258819045), (-4.2301270189, -2.5))
            ThreePointArc((-4.2301270189, -2.5), (-4.2435244785, -2.45), (-4.2801270189, -2.4133974596))
        make_face()
    extrude(amount=F1_DEPTH)


solid = f1.part
